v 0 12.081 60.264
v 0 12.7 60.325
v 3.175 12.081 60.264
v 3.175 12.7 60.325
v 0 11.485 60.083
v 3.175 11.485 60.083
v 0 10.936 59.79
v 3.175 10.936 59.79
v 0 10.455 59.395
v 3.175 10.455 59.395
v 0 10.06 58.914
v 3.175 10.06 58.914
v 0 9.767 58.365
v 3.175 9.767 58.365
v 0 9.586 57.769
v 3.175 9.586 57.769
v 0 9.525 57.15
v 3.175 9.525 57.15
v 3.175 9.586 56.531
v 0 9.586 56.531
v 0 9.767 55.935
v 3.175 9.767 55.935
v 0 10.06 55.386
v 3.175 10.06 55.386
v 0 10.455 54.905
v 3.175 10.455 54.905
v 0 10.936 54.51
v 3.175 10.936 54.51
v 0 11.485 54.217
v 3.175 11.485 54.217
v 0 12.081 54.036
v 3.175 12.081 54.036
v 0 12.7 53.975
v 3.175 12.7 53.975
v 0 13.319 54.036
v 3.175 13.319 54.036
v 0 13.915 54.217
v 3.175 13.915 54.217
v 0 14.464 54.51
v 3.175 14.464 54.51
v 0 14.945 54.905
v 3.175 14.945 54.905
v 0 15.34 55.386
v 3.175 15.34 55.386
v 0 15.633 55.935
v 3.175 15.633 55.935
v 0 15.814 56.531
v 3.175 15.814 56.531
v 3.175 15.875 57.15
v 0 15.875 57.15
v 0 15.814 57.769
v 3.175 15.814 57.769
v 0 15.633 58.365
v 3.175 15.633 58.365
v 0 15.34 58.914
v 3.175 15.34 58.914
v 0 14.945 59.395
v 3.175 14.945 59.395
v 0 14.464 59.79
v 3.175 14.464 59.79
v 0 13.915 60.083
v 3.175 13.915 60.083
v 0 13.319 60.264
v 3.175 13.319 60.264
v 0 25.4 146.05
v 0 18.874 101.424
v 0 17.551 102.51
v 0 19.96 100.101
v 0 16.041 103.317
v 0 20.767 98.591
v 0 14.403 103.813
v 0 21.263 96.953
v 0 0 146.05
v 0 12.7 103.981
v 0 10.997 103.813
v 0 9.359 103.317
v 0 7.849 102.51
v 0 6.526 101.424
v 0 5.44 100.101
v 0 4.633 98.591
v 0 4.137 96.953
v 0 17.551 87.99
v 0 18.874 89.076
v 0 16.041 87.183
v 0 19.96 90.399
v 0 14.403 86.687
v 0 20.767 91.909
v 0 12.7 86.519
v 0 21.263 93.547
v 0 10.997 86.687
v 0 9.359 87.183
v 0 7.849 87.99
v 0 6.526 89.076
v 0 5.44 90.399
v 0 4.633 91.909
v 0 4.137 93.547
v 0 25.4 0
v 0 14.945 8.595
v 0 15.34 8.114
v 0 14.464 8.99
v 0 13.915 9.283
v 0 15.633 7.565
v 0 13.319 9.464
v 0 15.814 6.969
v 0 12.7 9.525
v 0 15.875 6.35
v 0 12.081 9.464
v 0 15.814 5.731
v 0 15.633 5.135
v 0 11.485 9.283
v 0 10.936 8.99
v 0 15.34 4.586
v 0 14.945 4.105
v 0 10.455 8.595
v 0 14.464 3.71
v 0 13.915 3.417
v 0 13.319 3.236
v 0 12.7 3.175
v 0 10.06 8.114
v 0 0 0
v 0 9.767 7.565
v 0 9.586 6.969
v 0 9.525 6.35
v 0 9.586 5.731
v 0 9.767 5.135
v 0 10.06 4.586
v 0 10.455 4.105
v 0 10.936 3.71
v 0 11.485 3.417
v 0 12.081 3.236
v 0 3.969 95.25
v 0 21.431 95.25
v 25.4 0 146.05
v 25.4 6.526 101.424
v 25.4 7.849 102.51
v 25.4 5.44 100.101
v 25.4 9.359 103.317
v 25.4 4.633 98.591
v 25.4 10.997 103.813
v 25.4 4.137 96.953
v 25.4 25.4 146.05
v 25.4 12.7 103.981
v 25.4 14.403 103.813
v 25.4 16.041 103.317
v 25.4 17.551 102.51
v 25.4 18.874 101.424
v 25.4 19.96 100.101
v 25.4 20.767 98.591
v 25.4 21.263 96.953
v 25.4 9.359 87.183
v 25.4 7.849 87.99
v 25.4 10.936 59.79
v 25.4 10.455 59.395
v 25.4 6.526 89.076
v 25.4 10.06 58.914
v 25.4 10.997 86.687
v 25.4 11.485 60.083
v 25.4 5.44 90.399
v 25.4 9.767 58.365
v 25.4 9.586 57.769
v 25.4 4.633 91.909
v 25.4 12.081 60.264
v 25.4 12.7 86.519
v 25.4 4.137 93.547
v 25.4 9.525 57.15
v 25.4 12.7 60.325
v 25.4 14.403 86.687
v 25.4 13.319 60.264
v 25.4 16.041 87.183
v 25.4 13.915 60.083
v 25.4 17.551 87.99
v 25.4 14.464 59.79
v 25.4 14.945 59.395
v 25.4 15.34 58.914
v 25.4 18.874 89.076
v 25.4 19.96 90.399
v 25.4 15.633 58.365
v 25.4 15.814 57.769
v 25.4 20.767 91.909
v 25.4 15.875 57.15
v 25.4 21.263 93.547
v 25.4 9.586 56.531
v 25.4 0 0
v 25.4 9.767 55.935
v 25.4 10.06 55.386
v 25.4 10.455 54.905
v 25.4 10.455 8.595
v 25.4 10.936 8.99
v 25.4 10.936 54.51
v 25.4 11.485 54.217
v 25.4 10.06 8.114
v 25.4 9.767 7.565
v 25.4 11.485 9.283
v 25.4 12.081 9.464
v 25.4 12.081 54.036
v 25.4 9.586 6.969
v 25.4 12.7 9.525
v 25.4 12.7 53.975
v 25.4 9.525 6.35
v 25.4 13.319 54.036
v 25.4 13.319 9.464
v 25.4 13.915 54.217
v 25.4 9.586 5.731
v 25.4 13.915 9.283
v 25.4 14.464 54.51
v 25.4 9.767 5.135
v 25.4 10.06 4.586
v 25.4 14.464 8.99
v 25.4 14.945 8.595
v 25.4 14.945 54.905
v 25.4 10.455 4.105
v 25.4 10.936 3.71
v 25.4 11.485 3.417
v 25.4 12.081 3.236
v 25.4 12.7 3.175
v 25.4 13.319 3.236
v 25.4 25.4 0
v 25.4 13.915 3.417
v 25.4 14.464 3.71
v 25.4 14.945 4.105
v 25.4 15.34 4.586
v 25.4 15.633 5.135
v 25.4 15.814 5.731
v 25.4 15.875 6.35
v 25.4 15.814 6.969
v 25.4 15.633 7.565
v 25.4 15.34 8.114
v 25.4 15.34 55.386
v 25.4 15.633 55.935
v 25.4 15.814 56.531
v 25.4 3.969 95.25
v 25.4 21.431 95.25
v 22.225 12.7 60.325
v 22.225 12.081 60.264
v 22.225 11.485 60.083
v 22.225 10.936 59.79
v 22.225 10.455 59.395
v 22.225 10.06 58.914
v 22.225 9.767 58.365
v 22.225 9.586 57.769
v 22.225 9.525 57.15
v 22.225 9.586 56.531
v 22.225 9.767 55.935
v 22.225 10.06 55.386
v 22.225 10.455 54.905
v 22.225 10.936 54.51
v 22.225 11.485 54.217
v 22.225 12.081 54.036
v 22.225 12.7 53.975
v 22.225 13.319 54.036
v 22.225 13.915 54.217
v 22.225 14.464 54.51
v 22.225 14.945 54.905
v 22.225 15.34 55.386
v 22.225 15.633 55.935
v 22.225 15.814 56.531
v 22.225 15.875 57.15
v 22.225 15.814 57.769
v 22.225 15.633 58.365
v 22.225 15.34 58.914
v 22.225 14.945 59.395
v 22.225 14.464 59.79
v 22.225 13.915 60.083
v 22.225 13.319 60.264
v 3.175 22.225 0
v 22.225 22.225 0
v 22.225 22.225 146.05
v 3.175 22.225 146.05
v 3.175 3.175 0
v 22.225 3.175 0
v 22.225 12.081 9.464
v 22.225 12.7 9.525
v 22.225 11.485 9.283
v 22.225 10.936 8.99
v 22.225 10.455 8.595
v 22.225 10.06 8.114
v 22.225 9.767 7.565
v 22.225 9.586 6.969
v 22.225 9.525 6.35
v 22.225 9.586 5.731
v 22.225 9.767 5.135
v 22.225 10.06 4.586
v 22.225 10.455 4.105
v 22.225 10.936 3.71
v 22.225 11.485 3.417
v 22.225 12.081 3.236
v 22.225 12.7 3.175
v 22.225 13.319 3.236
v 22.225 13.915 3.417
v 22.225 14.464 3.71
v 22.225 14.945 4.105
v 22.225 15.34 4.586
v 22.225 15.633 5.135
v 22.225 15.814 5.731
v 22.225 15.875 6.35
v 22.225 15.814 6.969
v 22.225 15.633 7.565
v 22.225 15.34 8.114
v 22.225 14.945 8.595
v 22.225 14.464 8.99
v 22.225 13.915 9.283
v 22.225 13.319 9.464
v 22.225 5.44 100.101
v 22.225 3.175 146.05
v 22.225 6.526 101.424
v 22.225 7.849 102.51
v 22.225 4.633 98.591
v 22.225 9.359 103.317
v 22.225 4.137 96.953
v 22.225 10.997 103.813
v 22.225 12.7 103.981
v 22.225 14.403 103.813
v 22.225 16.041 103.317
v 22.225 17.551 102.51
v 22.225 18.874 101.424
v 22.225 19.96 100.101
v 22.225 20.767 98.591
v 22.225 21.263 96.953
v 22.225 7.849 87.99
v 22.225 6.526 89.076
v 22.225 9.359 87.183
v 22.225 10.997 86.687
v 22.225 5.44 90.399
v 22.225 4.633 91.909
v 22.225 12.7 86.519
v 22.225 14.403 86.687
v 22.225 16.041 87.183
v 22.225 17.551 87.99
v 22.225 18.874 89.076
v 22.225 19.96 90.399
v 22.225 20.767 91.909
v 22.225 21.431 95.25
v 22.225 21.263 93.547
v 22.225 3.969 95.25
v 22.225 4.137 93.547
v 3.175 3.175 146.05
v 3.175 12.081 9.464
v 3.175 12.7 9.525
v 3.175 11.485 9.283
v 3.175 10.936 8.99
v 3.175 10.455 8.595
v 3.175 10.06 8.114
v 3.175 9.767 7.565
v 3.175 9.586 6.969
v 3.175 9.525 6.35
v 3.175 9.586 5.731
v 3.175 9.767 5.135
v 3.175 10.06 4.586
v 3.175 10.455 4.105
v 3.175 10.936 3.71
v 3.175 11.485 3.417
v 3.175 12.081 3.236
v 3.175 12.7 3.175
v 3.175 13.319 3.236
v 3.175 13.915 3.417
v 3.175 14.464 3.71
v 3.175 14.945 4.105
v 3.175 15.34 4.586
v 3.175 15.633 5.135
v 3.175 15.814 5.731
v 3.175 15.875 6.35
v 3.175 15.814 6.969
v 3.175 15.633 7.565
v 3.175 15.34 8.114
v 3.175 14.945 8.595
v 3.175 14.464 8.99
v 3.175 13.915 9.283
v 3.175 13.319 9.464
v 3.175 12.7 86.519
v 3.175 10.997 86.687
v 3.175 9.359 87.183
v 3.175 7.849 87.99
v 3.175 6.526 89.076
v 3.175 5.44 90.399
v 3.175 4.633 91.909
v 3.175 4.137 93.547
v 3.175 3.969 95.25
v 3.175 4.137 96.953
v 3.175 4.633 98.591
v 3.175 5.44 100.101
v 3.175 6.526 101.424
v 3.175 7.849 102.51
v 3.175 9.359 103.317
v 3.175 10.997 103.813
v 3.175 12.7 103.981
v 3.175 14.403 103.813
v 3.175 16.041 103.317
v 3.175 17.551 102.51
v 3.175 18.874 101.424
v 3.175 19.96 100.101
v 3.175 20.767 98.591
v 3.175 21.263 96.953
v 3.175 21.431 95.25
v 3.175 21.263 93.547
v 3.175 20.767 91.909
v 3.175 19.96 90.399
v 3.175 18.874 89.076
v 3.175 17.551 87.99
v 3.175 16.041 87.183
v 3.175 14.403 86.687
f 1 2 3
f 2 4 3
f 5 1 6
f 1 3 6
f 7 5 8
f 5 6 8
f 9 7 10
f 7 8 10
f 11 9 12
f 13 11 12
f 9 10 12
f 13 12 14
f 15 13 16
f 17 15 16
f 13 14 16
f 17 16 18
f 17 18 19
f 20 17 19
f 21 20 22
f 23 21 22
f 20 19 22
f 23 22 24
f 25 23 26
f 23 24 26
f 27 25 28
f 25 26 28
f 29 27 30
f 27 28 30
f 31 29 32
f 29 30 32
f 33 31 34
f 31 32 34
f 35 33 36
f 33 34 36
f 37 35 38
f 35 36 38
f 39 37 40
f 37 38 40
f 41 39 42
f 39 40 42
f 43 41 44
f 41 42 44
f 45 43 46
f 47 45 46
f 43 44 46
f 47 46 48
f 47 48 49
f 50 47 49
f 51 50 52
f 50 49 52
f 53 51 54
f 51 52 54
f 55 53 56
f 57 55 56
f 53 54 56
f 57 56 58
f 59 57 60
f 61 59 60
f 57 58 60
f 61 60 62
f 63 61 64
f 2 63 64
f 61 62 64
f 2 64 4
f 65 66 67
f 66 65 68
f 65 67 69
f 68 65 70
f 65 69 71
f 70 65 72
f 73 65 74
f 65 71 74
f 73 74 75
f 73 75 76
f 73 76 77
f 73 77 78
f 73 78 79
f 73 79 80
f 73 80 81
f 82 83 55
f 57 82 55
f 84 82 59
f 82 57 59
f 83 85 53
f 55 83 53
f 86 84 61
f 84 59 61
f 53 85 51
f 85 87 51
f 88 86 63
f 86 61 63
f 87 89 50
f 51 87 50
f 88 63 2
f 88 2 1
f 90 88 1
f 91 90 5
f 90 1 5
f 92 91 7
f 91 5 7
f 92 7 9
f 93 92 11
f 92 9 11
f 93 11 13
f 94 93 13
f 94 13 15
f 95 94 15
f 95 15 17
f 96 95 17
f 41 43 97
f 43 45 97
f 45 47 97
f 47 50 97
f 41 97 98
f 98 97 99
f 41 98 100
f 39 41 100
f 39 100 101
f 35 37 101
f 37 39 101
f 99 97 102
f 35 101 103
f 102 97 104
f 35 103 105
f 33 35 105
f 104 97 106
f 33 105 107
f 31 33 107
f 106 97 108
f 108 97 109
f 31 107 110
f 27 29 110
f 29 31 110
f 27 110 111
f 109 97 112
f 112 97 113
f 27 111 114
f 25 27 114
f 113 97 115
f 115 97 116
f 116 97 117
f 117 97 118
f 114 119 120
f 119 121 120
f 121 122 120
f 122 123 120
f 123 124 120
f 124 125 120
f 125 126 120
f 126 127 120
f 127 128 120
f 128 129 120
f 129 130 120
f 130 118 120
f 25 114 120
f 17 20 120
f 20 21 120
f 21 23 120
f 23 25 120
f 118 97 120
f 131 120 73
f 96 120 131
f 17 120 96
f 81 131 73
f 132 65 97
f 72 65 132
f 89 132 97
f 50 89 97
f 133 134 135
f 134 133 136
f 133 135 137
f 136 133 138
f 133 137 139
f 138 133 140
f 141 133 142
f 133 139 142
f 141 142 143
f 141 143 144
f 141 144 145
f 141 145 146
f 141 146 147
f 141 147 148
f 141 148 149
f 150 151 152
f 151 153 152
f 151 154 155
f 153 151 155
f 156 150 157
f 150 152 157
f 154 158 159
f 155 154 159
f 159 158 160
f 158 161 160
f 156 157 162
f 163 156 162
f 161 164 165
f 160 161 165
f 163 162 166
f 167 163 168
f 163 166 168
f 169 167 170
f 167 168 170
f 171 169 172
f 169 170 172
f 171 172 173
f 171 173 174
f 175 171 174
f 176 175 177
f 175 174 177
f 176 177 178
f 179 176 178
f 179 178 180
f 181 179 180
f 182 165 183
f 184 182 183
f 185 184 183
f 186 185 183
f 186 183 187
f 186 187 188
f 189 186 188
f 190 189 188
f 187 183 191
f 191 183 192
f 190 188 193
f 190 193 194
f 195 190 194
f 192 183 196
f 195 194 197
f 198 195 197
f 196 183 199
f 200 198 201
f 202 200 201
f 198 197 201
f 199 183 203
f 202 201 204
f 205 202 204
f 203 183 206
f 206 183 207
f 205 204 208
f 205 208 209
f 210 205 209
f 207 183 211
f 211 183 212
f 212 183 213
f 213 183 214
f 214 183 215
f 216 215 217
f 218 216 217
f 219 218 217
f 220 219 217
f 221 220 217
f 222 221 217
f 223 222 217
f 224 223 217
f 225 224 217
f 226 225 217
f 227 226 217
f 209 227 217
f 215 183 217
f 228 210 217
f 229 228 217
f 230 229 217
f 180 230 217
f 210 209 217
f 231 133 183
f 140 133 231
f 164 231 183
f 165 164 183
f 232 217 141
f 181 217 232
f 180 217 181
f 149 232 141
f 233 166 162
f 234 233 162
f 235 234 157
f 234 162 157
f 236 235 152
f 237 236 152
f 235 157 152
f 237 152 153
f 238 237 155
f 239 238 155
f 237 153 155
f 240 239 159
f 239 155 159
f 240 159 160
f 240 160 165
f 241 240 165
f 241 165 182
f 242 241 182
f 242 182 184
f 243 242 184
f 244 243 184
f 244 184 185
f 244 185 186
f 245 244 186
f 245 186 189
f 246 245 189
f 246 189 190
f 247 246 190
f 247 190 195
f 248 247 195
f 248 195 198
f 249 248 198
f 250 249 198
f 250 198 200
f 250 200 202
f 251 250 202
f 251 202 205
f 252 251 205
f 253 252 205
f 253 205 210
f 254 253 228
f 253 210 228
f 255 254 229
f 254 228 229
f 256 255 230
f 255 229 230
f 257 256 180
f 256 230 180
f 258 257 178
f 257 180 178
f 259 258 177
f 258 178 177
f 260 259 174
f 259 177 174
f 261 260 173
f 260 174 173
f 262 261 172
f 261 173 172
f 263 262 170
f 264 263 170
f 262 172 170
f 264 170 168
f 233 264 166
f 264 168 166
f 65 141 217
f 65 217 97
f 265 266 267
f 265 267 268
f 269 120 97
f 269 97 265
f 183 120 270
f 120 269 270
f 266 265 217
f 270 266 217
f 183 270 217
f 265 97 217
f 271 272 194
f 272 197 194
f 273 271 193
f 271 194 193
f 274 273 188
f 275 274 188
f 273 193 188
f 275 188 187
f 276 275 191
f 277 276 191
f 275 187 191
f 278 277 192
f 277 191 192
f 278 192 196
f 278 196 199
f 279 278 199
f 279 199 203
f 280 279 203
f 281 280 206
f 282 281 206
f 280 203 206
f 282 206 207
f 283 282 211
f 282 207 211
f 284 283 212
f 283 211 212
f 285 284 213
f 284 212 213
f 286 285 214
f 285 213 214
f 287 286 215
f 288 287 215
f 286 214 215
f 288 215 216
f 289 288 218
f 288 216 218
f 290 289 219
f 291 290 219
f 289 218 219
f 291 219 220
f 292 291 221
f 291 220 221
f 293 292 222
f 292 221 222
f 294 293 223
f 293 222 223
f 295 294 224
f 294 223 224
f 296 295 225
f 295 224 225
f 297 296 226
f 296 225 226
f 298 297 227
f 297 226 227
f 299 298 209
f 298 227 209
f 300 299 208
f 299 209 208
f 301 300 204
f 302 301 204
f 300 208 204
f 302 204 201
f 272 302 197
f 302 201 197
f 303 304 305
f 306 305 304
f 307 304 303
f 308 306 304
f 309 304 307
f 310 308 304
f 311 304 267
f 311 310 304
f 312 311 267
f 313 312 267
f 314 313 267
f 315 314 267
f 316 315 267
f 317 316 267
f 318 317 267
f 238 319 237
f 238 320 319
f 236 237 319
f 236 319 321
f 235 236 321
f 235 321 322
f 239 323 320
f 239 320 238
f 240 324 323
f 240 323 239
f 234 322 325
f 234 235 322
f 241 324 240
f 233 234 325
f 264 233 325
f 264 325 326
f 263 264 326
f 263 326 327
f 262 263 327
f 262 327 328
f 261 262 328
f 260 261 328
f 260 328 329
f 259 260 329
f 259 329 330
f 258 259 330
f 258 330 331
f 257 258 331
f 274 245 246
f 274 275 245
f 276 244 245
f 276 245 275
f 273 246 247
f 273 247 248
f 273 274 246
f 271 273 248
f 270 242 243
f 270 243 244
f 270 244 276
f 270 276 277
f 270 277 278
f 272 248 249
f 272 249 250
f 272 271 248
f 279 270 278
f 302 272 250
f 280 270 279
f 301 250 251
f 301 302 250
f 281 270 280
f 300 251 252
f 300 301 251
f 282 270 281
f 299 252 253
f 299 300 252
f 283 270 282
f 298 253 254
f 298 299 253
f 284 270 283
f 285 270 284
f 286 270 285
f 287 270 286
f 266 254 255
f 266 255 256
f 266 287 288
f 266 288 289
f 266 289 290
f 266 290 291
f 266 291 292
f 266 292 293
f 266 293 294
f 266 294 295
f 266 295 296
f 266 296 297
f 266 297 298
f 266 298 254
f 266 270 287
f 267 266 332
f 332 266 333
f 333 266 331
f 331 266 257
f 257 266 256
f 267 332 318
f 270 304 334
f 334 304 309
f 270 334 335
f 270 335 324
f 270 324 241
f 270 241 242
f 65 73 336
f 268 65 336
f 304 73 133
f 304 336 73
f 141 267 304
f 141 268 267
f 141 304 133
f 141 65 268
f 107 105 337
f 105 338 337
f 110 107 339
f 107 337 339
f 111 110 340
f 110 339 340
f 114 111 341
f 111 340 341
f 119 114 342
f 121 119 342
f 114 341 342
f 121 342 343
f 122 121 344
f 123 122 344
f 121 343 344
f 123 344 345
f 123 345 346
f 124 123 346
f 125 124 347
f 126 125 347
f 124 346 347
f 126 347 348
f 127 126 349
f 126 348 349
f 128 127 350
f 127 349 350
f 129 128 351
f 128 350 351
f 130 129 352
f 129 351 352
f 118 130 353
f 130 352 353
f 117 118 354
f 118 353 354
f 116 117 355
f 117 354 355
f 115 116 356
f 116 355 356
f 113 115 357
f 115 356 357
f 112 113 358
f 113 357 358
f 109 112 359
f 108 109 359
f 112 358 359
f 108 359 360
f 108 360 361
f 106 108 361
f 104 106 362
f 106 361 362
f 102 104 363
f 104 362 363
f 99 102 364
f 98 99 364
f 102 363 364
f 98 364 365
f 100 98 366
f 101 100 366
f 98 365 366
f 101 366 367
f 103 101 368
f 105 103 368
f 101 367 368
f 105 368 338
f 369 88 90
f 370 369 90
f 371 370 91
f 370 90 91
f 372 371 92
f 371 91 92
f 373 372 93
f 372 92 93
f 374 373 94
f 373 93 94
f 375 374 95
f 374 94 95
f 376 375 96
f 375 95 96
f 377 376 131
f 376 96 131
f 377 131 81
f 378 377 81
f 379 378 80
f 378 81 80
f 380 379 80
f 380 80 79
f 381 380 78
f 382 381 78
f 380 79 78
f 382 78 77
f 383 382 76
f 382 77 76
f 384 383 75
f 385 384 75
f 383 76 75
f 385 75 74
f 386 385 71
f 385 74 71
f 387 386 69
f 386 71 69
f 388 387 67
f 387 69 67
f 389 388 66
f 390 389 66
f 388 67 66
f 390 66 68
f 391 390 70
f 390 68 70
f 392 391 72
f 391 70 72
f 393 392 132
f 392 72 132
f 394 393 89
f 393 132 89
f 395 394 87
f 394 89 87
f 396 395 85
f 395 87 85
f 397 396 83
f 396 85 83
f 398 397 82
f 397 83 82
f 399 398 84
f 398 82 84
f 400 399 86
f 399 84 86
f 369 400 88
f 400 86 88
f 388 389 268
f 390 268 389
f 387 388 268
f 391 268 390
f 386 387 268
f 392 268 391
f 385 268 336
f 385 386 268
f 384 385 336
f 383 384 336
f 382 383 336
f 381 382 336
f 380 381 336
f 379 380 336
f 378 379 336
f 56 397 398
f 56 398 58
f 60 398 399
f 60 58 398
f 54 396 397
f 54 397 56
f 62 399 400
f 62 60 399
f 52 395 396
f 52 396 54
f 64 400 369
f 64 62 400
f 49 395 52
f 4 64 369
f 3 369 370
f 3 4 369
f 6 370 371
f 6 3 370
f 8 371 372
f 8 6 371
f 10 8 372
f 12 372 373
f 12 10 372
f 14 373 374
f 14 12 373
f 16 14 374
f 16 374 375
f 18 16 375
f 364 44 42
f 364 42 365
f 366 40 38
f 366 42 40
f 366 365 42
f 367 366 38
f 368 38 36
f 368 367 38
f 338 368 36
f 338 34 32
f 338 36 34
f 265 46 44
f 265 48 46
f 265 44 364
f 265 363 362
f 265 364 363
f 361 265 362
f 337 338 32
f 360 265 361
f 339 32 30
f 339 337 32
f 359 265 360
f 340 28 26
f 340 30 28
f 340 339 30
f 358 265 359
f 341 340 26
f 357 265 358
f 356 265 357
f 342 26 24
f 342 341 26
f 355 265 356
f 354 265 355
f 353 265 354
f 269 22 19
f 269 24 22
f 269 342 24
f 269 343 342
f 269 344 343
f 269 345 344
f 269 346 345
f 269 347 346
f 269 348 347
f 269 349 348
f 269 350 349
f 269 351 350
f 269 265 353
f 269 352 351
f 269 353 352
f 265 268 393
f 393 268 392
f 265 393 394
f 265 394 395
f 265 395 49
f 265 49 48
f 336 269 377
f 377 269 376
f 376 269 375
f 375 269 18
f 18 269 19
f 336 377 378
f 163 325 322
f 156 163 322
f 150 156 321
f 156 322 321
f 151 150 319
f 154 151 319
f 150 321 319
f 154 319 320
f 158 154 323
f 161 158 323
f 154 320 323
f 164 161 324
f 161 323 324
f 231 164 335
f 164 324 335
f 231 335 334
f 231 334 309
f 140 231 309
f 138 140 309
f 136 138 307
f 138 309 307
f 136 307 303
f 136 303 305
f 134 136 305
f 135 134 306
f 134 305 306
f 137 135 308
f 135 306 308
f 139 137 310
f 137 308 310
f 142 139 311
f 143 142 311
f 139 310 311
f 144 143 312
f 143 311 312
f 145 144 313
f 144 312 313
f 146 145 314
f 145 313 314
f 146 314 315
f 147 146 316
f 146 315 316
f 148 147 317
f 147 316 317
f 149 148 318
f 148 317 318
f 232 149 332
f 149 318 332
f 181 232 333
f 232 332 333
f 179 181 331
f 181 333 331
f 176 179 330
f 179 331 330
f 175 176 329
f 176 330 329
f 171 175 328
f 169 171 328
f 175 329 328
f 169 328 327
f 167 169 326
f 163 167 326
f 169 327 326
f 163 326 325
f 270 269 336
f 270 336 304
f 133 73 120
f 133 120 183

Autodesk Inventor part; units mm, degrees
ref_plane "YZ Plane" through (0, 0, 0) normal (1, 0, 0) x (0, 1, 0)
ref_plane "XZ Plane" through (0, 0, 0) normal (0, 1, 0) x (-1, 0, 0)
ref_plane "XY Plane" through (0, 0, 0) normal (0, 0, 1) x (1, 0, 0)
sketch "Sketch1" plane through (0, 0, 0) normal (0, 0, 1) x (1, 0, 0)
  line L0 (0, 0) -> (25.4, 0)
  line L1 (25.4, 0) -> (25.4, 25.4)
  line L2 (25.4, 25.4) -> (0, 25.4)
  line L3 (0, 25.4) -> (0, 0)
  line L4 (3.175, 3.175) -> (22.225, 3.175)
  line L5 (22.225, 3.175) -> (22.225, 22.225)
  line L6 (22.225, 22.225) -> (3.175, 22.225)
  line L7 (3.175, 22.225) -> (3.175, 3.175)
  dimension "d0" = 25.4
  dimension "d1" = 25.4
  dimension "d2" = 19.05
  dimension "d3" = 19.05
  dimension "d4" = 3.175
  dimension "d5" = 3.175
extrude "Extrusion1" add sketch "Sketch1" along normal blind 146.05
sketch "Sketch2" plane through (0, 0, 0) normal (-1, 0, 0) x (0, 0, 1)
  line L0 (0, 25.4) -> (0, 0) projected
  line L1 (0, 0) -> (146.05, 0) projected
  point P0 (6.35, 12.7)
  point P1 (57.15, 12.7)
  dimension "d8" = 12.7
  dimension "d9" = 6.35
  dimension "d10" = 12.7
  dimension "d11" = 57.15
hole "Hole1" at (0, 12.7, 6.35) at (0, 12.7, 57.15) direction (1, 0, 0) diameter 6.35 end through all
sketch "Sketch3" plane through (25.4, 0, 0) normal (1, 0, 0) x (0, 0, -1)
  line L0 (-146.05, 0) -> (-146.05, 25.4) projected
  line L1 (0, 0) -> (-146.05, 0) projected
  point P0 (-95.25, 12.7)
  dimension "d19" = 50.8
  dimension "d20" = 12.7
hole "Hole2" at (25.4, 12.7, 95.25) direction (-1, 0, 0) diameter 17.4625 end through all
properties part number "back roller 1x1"
